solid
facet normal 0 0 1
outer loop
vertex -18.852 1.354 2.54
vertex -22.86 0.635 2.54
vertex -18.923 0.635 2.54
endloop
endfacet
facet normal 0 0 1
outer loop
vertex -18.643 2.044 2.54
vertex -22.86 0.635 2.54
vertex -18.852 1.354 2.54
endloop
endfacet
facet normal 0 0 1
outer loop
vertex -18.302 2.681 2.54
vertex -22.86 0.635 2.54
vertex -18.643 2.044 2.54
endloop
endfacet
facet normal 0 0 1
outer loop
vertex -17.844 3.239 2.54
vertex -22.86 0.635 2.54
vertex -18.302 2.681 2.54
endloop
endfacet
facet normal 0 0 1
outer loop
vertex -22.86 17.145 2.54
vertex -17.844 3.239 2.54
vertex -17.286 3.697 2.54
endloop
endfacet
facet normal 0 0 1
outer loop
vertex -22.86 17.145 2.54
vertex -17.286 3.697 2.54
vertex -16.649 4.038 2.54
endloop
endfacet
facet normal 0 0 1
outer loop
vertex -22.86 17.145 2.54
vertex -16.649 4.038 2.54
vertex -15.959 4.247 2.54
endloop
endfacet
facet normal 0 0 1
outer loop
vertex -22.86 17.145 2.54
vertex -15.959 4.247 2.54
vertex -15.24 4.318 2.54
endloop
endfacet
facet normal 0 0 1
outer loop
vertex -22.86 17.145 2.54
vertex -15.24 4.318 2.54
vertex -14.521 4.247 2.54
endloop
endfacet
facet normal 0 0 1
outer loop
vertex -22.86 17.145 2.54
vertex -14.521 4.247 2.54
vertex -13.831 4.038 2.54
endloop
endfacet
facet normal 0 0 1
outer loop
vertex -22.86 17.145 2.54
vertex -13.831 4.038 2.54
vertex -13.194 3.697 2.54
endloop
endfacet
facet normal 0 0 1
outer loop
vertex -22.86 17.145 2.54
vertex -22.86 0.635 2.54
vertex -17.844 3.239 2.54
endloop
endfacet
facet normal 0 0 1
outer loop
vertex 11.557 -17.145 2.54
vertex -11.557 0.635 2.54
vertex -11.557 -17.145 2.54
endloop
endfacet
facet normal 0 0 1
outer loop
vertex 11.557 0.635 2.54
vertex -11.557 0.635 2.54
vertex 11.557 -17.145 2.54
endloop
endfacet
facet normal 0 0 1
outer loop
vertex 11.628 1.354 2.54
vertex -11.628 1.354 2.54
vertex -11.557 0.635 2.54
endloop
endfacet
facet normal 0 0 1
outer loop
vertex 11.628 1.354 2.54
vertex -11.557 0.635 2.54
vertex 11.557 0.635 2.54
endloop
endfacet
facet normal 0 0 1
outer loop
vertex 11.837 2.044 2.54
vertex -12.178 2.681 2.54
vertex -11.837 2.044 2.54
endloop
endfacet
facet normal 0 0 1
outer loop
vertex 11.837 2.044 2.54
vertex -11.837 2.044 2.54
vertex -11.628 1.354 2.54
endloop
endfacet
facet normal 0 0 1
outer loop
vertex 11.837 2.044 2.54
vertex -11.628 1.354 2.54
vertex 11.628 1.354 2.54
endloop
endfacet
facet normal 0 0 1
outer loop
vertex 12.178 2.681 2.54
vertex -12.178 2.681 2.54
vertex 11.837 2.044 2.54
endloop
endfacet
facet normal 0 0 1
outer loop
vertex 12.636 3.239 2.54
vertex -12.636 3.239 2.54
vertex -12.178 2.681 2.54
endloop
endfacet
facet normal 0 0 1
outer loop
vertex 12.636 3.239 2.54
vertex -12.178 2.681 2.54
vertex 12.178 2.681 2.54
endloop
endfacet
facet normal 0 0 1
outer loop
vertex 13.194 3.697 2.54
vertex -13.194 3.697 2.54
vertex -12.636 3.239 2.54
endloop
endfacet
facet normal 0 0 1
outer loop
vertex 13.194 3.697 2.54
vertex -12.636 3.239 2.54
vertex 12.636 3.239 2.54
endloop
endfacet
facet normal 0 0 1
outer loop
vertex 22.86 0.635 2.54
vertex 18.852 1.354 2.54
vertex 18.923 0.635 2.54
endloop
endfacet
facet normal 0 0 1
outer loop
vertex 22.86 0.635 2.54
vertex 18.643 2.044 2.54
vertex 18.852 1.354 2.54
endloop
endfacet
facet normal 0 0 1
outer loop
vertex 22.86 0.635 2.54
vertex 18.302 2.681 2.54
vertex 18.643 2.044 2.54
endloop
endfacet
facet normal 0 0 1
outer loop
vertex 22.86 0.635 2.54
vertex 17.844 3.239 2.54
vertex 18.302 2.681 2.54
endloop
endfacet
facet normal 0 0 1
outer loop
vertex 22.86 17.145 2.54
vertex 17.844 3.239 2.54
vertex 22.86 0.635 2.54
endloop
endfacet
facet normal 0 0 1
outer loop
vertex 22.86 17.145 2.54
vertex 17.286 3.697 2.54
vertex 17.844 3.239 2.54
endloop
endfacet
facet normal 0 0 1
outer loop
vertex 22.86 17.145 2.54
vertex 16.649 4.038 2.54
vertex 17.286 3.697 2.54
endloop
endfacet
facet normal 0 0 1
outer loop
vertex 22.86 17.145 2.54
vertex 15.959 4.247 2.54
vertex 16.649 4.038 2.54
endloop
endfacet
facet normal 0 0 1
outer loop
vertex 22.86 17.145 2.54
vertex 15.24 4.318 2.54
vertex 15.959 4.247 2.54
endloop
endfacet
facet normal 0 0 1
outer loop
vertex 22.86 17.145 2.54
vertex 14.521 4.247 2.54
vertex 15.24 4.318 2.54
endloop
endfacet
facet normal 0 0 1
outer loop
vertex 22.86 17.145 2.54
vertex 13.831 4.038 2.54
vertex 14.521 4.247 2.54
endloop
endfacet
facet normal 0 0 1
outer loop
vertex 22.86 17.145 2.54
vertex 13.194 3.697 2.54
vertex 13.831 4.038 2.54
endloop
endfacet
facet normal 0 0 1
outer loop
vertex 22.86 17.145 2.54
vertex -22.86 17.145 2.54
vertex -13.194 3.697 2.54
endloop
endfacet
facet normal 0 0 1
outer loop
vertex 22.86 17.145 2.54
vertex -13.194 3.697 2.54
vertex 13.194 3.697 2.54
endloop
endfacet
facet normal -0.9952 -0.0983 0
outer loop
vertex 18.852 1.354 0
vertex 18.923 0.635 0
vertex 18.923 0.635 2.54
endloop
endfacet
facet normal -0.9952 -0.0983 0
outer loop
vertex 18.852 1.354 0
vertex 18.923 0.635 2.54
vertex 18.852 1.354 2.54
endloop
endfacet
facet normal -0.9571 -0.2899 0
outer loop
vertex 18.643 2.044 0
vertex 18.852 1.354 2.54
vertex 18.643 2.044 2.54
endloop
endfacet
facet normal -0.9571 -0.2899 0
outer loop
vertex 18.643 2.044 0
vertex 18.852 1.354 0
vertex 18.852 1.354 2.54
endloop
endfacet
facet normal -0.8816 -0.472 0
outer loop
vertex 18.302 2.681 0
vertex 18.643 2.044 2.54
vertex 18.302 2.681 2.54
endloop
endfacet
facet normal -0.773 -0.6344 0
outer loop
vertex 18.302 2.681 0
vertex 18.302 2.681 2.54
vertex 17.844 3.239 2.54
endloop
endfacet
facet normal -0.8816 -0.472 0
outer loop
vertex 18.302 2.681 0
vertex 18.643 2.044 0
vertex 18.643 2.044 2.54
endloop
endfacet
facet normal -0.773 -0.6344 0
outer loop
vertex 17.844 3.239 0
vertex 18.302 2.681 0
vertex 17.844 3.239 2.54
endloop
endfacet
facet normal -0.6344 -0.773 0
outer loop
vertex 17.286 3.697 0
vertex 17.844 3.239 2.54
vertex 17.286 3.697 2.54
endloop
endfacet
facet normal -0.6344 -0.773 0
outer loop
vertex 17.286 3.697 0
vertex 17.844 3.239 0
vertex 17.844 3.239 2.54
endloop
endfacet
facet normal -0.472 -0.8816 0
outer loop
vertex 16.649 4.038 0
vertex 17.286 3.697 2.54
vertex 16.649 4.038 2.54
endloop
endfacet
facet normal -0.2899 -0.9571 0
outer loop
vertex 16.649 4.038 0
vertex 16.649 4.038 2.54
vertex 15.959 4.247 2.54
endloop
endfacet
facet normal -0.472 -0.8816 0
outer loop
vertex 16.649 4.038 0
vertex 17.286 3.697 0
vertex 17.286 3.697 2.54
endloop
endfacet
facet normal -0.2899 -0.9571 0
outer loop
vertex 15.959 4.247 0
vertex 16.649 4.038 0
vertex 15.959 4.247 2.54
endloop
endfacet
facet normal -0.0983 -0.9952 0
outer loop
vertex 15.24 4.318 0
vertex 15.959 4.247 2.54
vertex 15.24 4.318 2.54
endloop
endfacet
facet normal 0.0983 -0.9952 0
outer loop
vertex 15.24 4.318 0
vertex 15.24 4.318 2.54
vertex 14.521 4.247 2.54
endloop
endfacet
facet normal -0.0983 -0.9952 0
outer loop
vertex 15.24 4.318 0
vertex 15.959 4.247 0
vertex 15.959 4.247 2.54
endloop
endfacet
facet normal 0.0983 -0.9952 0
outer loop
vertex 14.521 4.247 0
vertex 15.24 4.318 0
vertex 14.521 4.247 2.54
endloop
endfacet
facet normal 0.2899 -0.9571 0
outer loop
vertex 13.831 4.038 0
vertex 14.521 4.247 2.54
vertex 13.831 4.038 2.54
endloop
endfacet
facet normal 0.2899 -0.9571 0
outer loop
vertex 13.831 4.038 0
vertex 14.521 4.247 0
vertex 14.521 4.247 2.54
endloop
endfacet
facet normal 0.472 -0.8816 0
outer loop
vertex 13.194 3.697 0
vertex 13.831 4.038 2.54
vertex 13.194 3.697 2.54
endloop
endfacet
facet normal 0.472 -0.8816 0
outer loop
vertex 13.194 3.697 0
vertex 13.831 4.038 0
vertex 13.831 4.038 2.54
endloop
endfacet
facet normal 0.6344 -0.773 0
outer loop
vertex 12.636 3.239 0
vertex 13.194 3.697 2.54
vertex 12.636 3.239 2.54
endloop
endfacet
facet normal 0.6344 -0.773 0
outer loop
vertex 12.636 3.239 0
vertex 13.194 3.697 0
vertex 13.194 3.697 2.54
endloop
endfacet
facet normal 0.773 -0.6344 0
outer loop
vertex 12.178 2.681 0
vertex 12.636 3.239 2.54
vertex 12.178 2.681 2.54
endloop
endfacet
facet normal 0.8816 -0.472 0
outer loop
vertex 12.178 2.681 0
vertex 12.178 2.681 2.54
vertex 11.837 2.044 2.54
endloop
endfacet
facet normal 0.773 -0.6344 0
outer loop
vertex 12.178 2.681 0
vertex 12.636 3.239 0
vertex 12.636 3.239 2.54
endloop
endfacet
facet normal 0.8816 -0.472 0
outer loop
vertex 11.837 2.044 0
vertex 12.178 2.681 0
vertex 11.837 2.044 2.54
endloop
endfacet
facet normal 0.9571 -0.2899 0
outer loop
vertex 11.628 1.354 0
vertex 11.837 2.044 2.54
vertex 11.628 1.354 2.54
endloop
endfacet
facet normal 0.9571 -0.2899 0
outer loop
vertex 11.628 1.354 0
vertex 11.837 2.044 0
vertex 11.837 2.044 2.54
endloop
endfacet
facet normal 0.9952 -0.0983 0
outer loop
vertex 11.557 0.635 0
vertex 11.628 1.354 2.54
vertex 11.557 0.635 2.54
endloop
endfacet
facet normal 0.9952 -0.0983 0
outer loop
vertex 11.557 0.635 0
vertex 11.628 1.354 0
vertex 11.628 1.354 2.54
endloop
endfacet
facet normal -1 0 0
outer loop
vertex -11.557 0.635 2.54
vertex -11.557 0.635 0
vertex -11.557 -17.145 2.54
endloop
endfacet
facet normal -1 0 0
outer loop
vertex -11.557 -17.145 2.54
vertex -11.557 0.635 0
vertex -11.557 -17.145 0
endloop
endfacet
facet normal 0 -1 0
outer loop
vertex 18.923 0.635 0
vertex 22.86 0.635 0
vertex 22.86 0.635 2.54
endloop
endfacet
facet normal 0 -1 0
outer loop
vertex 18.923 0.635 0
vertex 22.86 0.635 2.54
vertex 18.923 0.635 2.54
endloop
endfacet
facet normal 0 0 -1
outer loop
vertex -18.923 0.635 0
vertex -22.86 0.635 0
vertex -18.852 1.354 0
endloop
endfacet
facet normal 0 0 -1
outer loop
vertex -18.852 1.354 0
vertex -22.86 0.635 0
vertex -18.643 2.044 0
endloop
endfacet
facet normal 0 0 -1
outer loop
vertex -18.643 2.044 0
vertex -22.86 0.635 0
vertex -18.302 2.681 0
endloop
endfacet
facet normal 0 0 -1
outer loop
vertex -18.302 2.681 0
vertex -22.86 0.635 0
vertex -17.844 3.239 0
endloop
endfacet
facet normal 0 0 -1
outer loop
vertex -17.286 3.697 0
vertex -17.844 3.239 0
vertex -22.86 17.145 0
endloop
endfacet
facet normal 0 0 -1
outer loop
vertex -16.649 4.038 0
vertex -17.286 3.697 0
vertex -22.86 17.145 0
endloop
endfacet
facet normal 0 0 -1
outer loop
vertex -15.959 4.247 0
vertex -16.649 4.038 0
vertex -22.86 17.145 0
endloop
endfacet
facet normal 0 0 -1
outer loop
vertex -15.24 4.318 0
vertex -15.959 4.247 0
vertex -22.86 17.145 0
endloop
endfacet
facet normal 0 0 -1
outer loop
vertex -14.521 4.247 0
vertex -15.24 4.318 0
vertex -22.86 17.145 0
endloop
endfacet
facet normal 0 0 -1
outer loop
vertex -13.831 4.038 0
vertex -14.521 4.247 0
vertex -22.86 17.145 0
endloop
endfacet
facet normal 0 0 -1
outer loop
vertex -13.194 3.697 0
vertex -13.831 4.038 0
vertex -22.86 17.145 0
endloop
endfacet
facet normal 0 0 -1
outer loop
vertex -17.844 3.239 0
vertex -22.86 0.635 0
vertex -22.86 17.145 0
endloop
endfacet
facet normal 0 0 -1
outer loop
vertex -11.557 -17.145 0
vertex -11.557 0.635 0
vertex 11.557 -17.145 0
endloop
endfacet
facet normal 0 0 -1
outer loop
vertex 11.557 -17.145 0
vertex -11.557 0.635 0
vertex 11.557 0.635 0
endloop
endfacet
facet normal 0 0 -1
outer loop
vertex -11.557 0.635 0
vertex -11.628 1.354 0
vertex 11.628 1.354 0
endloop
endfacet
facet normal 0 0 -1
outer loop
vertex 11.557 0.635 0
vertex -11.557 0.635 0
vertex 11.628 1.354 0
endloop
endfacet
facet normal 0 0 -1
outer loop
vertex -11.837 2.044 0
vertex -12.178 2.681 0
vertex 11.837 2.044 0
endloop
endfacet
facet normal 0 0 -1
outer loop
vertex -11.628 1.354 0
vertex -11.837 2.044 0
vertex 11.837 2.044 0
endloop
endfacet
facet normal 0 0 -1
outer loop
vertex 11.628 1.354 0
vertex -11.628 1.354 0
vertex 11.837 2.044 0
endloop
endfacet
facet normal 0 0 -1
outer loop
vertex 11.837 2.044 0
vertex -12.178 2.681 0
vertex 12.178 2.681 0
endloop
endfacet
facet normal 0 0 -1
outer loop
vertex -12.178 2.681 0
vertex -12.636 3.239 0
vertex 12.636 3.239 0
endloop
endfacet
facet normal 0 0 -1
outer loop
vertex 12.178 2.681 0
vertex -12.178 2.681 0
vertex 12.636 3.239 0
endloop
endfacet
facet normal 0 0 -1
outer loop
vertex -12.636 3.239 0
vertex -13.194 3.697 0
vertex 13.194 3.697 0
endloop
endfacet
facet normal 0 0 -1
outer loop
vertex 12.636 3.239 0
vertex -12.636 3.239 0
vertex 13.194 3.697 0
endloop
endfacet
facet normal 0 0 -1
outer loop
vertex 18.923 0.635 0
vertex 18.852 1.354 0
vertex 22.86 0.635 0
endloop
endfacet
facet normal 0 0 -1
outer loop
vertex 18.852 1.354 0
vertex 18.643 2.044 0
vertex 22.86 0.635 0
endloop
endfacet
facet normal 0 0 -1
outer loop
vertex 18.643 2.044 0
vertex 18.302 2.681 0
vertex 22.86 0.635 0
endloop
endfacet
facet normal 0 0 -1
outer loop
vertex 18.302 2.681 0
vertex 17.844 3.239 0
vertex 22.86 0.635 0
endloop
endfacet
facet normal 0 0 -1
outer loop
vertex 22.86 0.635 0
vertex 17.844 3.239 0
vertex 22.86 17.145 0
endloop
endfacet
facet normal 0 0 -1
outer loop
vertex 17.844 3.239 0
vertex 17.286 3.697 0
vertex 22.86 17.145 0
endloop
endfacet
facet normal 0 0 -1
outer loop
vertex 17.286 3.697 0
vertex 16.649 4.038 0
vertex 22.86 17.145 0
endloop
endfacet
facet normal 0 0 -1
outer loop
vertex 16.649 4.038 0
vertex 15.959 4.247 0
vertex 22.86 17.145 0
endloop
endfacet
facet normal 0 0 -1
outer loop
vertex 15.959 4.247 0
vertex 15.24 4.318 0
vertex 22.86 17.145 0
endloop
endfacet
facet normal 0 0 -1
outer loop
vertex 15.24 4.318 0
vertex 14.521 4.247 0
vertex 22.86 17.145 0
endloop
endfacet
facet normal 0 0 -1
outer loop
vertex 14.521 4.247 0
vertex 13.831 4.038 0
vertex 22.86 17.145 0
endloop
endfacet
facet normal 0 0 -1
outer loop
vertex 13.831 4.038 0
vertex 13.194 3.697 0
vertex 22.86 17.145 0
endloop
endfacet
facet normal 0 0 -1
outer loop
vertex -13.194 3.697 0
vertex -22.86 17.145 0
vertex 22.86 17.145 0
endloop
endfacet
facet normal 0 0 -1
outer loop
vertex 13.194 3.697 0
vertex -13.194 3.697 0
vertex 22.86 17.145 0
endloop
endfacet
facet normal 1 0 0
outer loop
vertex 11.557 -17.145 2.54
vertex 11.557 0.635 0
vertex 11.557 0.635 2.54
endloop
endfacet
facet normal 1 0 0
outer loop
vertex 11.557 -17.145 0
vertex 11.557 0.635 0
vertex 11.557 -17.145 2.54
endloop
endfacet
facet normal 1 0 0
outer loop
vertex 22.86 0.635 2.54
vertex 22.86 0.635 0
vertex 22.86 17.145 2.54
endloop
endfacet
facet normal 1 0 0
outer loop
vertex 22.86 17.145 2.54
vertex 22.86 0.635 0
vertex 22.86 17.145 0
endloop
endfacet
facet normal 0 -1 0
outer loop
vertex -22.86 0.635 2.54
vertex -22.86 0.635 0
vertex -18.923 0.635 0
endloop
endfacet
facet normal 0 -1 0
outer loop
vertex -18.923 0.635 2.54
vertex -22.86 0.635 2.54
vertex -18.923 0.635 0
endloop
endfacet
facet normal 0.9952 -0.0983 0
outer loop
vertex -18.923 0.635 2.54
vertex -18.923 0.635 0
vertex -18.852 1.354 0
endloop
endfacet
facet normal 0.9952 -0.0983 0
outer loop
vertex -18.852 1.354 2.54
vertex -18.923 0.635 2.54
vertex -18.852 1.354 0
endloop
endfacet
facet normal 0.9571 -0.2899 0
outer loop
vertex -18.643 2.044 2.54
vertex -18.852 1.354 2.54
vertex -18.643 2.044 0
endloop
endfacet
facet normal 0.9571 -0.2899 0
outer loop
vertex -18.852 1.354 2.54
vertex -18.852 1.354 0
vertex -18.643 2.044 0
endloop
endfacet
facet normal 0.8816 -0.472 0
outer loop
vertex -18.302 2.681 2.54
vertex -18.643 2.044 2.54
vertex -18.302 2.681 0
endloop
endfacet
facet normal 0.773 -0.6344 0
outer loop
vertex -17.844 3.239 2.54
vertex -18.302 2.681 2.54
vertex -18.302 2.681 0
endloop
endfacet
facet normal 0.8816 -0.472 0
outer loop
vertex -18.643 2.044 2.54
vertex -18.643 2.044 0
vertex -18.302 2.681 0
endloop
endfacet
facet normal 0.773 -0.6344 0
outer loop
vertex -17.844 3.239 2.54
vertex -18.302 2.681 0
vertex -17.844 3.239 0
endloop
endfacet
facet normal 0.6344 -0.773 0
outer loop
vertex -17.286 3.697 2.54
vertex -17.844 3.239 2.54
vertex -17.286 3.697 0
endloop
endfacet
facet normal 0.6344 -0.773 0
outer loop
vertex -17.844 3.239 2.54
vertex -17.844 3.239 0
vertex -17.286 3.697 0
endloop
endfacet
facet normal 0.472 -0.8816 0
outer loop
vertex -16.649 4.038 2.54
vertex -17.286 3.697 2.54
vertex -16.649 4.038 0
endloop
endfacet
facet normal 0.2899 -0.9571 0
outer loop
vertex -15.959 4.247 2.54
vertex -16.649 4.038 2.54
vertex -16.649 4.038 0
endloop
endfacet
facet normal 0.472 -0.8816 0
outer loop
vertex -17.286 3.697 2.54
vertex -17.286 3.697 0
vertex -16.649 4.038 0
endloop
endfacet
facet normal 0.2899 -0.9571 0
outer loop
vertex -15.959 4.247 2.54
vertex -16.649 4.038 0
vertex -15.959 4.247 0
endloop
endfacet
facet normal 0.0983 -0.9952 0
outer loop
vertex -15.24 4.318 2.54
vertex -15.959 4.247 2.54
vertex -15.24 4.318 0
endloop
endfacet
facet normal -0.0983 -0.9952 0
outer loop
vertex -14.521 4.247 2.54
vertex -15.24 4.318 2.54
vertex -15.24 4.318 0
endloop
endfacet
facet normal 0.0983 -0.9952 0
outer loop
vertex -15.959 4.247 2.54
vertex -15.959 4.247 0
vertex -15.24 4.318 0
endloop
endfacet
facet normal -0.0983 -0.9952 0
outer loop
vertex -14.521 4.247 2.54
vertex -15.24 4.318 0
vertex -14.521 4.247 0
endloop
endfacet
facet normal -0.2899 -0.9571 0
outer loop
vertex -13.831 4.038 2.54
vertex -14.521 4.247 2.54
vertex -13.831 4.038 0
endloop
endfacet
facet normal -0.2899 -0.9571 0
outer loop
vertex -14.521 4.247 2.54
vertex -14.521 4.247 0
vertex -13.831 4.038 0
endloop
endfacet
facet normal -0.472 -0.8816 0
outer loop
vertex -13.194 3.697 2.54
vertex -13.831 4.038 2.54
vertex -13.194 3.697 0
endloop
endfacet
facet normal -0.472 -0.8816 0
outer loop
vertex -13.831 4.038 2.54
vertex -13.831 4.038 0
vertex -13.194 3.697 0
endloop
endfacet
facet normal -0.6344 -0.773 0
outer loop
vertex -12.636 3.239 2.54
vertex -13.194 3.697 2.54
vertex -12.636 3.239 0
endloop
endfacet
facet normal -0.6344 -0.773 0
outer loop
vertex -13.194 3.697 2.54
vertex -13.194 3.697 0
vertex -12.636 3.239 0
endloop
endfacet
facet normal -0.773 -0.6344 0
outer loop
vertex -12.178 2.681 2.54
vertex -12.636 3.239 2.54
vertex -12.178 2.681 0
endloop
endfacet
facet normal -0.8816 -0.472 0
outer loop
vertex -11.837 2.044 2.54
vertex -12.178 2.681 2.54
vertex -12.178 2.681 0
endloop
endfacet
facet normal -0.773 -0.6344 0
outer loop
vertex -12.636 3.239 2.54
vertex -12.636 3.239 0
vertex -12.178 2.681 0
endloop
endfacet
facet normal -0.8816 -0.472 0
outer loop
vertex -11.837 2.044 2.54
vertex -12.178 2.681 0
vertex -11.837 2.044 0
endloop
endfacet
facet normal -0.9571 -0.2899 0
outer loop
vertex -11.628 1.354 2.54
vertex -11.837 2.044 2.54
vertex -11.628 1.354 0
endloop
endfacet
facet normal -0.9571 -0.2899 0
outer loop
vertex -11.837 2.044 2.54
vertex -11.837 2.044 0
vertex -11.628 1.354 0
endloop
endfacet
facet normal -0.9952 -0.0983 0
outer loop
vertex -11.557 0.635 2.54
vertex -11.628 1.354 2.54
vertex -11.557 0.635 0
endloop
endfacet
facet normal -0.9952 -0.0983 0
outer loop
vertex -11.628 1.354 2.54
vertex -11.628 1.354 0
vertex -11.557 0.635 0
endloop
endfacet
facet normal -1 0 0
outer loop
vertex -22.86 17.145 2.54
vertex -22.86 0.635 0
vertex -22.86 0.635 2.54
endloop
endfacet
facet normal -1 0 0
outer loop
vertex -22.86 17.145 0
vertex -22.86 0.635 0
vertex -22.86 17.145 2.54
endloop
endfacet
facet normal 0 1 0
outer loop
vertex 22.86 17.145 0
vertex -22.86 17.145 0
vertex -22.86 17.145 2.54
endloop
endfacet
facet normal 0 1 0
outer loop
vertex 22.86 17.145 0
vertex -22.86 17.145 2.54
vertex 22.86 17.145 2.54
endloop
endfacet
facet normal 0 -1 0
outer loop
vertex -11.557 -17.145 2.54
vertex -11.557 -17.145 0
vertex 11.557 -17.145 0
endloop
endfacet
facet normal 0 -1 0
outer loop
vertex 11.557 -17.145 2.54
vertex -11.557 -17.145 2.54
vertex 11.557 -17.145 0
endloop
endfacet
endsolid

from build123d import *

# Parameters (mm, degrees)
SKETCH1_W           = 45.72
SKETCH1_H           = 34.29
SKETCH1_R           = 3.175
BOSS_EXTRUDE1_DEPTH = 2.54
CUT_EXTRUDE1_DEPTH  = 2.54


with BuildPart() as part:
    # Sketch1 → Boss-Extrude1 (new body)
    with BuildSketch(Plane.XY):
        Rectangle(SKETCH1_W, SKETCH1_H)
        with Locations((15.24, 0.635)):
            Circle(SKETCH1_R, mode=Mode.SUBTRACT)
        with Locations(Location((-15.24, 0.635, 0), (0, 0, 180))):
            Circle(SKETCH1_R, mode=Mode.SUBTRACT)
    extrude(amount=BOSS_EXTRUDE1_DEPTH)

    # Sketch2 → Cut-Extrude1 (cut)
    with BuildSketch(Plane.XY):
        with BuildLine():
            Line((11.557, 0.635), (11.557, -17.145))
            Line((11.557, -17.145), (22.86, -17.145))
            Line((22.86, -17.145), (22.86, 0.635))
            Line((22.86, 0.635), (18.923, 0.635))
            ThreePointArc((18.923, 0.635), (15.24, 4.318), (11.557, 0.635))
        make_face()
        with BuildLine():
            Line((-11.557, 0.635), (-11.557, -17.145))
            Line((-11.557, -17.145), (-22.86, -17.145))
            Line((-22.86, -17.145), (-22.86, 0.635))
            Line((-22.86, 0.635), (-18.923, 0.635))
            ThreePointArc((-18.923, 0.635), (-15.24, 4.318), (-11.557, 0.635))
        make_face()
    extrude(amount=CUT_EXTRUDE1_DEPTH, mode=Mode.SUBTRACT)


solid = part.part
